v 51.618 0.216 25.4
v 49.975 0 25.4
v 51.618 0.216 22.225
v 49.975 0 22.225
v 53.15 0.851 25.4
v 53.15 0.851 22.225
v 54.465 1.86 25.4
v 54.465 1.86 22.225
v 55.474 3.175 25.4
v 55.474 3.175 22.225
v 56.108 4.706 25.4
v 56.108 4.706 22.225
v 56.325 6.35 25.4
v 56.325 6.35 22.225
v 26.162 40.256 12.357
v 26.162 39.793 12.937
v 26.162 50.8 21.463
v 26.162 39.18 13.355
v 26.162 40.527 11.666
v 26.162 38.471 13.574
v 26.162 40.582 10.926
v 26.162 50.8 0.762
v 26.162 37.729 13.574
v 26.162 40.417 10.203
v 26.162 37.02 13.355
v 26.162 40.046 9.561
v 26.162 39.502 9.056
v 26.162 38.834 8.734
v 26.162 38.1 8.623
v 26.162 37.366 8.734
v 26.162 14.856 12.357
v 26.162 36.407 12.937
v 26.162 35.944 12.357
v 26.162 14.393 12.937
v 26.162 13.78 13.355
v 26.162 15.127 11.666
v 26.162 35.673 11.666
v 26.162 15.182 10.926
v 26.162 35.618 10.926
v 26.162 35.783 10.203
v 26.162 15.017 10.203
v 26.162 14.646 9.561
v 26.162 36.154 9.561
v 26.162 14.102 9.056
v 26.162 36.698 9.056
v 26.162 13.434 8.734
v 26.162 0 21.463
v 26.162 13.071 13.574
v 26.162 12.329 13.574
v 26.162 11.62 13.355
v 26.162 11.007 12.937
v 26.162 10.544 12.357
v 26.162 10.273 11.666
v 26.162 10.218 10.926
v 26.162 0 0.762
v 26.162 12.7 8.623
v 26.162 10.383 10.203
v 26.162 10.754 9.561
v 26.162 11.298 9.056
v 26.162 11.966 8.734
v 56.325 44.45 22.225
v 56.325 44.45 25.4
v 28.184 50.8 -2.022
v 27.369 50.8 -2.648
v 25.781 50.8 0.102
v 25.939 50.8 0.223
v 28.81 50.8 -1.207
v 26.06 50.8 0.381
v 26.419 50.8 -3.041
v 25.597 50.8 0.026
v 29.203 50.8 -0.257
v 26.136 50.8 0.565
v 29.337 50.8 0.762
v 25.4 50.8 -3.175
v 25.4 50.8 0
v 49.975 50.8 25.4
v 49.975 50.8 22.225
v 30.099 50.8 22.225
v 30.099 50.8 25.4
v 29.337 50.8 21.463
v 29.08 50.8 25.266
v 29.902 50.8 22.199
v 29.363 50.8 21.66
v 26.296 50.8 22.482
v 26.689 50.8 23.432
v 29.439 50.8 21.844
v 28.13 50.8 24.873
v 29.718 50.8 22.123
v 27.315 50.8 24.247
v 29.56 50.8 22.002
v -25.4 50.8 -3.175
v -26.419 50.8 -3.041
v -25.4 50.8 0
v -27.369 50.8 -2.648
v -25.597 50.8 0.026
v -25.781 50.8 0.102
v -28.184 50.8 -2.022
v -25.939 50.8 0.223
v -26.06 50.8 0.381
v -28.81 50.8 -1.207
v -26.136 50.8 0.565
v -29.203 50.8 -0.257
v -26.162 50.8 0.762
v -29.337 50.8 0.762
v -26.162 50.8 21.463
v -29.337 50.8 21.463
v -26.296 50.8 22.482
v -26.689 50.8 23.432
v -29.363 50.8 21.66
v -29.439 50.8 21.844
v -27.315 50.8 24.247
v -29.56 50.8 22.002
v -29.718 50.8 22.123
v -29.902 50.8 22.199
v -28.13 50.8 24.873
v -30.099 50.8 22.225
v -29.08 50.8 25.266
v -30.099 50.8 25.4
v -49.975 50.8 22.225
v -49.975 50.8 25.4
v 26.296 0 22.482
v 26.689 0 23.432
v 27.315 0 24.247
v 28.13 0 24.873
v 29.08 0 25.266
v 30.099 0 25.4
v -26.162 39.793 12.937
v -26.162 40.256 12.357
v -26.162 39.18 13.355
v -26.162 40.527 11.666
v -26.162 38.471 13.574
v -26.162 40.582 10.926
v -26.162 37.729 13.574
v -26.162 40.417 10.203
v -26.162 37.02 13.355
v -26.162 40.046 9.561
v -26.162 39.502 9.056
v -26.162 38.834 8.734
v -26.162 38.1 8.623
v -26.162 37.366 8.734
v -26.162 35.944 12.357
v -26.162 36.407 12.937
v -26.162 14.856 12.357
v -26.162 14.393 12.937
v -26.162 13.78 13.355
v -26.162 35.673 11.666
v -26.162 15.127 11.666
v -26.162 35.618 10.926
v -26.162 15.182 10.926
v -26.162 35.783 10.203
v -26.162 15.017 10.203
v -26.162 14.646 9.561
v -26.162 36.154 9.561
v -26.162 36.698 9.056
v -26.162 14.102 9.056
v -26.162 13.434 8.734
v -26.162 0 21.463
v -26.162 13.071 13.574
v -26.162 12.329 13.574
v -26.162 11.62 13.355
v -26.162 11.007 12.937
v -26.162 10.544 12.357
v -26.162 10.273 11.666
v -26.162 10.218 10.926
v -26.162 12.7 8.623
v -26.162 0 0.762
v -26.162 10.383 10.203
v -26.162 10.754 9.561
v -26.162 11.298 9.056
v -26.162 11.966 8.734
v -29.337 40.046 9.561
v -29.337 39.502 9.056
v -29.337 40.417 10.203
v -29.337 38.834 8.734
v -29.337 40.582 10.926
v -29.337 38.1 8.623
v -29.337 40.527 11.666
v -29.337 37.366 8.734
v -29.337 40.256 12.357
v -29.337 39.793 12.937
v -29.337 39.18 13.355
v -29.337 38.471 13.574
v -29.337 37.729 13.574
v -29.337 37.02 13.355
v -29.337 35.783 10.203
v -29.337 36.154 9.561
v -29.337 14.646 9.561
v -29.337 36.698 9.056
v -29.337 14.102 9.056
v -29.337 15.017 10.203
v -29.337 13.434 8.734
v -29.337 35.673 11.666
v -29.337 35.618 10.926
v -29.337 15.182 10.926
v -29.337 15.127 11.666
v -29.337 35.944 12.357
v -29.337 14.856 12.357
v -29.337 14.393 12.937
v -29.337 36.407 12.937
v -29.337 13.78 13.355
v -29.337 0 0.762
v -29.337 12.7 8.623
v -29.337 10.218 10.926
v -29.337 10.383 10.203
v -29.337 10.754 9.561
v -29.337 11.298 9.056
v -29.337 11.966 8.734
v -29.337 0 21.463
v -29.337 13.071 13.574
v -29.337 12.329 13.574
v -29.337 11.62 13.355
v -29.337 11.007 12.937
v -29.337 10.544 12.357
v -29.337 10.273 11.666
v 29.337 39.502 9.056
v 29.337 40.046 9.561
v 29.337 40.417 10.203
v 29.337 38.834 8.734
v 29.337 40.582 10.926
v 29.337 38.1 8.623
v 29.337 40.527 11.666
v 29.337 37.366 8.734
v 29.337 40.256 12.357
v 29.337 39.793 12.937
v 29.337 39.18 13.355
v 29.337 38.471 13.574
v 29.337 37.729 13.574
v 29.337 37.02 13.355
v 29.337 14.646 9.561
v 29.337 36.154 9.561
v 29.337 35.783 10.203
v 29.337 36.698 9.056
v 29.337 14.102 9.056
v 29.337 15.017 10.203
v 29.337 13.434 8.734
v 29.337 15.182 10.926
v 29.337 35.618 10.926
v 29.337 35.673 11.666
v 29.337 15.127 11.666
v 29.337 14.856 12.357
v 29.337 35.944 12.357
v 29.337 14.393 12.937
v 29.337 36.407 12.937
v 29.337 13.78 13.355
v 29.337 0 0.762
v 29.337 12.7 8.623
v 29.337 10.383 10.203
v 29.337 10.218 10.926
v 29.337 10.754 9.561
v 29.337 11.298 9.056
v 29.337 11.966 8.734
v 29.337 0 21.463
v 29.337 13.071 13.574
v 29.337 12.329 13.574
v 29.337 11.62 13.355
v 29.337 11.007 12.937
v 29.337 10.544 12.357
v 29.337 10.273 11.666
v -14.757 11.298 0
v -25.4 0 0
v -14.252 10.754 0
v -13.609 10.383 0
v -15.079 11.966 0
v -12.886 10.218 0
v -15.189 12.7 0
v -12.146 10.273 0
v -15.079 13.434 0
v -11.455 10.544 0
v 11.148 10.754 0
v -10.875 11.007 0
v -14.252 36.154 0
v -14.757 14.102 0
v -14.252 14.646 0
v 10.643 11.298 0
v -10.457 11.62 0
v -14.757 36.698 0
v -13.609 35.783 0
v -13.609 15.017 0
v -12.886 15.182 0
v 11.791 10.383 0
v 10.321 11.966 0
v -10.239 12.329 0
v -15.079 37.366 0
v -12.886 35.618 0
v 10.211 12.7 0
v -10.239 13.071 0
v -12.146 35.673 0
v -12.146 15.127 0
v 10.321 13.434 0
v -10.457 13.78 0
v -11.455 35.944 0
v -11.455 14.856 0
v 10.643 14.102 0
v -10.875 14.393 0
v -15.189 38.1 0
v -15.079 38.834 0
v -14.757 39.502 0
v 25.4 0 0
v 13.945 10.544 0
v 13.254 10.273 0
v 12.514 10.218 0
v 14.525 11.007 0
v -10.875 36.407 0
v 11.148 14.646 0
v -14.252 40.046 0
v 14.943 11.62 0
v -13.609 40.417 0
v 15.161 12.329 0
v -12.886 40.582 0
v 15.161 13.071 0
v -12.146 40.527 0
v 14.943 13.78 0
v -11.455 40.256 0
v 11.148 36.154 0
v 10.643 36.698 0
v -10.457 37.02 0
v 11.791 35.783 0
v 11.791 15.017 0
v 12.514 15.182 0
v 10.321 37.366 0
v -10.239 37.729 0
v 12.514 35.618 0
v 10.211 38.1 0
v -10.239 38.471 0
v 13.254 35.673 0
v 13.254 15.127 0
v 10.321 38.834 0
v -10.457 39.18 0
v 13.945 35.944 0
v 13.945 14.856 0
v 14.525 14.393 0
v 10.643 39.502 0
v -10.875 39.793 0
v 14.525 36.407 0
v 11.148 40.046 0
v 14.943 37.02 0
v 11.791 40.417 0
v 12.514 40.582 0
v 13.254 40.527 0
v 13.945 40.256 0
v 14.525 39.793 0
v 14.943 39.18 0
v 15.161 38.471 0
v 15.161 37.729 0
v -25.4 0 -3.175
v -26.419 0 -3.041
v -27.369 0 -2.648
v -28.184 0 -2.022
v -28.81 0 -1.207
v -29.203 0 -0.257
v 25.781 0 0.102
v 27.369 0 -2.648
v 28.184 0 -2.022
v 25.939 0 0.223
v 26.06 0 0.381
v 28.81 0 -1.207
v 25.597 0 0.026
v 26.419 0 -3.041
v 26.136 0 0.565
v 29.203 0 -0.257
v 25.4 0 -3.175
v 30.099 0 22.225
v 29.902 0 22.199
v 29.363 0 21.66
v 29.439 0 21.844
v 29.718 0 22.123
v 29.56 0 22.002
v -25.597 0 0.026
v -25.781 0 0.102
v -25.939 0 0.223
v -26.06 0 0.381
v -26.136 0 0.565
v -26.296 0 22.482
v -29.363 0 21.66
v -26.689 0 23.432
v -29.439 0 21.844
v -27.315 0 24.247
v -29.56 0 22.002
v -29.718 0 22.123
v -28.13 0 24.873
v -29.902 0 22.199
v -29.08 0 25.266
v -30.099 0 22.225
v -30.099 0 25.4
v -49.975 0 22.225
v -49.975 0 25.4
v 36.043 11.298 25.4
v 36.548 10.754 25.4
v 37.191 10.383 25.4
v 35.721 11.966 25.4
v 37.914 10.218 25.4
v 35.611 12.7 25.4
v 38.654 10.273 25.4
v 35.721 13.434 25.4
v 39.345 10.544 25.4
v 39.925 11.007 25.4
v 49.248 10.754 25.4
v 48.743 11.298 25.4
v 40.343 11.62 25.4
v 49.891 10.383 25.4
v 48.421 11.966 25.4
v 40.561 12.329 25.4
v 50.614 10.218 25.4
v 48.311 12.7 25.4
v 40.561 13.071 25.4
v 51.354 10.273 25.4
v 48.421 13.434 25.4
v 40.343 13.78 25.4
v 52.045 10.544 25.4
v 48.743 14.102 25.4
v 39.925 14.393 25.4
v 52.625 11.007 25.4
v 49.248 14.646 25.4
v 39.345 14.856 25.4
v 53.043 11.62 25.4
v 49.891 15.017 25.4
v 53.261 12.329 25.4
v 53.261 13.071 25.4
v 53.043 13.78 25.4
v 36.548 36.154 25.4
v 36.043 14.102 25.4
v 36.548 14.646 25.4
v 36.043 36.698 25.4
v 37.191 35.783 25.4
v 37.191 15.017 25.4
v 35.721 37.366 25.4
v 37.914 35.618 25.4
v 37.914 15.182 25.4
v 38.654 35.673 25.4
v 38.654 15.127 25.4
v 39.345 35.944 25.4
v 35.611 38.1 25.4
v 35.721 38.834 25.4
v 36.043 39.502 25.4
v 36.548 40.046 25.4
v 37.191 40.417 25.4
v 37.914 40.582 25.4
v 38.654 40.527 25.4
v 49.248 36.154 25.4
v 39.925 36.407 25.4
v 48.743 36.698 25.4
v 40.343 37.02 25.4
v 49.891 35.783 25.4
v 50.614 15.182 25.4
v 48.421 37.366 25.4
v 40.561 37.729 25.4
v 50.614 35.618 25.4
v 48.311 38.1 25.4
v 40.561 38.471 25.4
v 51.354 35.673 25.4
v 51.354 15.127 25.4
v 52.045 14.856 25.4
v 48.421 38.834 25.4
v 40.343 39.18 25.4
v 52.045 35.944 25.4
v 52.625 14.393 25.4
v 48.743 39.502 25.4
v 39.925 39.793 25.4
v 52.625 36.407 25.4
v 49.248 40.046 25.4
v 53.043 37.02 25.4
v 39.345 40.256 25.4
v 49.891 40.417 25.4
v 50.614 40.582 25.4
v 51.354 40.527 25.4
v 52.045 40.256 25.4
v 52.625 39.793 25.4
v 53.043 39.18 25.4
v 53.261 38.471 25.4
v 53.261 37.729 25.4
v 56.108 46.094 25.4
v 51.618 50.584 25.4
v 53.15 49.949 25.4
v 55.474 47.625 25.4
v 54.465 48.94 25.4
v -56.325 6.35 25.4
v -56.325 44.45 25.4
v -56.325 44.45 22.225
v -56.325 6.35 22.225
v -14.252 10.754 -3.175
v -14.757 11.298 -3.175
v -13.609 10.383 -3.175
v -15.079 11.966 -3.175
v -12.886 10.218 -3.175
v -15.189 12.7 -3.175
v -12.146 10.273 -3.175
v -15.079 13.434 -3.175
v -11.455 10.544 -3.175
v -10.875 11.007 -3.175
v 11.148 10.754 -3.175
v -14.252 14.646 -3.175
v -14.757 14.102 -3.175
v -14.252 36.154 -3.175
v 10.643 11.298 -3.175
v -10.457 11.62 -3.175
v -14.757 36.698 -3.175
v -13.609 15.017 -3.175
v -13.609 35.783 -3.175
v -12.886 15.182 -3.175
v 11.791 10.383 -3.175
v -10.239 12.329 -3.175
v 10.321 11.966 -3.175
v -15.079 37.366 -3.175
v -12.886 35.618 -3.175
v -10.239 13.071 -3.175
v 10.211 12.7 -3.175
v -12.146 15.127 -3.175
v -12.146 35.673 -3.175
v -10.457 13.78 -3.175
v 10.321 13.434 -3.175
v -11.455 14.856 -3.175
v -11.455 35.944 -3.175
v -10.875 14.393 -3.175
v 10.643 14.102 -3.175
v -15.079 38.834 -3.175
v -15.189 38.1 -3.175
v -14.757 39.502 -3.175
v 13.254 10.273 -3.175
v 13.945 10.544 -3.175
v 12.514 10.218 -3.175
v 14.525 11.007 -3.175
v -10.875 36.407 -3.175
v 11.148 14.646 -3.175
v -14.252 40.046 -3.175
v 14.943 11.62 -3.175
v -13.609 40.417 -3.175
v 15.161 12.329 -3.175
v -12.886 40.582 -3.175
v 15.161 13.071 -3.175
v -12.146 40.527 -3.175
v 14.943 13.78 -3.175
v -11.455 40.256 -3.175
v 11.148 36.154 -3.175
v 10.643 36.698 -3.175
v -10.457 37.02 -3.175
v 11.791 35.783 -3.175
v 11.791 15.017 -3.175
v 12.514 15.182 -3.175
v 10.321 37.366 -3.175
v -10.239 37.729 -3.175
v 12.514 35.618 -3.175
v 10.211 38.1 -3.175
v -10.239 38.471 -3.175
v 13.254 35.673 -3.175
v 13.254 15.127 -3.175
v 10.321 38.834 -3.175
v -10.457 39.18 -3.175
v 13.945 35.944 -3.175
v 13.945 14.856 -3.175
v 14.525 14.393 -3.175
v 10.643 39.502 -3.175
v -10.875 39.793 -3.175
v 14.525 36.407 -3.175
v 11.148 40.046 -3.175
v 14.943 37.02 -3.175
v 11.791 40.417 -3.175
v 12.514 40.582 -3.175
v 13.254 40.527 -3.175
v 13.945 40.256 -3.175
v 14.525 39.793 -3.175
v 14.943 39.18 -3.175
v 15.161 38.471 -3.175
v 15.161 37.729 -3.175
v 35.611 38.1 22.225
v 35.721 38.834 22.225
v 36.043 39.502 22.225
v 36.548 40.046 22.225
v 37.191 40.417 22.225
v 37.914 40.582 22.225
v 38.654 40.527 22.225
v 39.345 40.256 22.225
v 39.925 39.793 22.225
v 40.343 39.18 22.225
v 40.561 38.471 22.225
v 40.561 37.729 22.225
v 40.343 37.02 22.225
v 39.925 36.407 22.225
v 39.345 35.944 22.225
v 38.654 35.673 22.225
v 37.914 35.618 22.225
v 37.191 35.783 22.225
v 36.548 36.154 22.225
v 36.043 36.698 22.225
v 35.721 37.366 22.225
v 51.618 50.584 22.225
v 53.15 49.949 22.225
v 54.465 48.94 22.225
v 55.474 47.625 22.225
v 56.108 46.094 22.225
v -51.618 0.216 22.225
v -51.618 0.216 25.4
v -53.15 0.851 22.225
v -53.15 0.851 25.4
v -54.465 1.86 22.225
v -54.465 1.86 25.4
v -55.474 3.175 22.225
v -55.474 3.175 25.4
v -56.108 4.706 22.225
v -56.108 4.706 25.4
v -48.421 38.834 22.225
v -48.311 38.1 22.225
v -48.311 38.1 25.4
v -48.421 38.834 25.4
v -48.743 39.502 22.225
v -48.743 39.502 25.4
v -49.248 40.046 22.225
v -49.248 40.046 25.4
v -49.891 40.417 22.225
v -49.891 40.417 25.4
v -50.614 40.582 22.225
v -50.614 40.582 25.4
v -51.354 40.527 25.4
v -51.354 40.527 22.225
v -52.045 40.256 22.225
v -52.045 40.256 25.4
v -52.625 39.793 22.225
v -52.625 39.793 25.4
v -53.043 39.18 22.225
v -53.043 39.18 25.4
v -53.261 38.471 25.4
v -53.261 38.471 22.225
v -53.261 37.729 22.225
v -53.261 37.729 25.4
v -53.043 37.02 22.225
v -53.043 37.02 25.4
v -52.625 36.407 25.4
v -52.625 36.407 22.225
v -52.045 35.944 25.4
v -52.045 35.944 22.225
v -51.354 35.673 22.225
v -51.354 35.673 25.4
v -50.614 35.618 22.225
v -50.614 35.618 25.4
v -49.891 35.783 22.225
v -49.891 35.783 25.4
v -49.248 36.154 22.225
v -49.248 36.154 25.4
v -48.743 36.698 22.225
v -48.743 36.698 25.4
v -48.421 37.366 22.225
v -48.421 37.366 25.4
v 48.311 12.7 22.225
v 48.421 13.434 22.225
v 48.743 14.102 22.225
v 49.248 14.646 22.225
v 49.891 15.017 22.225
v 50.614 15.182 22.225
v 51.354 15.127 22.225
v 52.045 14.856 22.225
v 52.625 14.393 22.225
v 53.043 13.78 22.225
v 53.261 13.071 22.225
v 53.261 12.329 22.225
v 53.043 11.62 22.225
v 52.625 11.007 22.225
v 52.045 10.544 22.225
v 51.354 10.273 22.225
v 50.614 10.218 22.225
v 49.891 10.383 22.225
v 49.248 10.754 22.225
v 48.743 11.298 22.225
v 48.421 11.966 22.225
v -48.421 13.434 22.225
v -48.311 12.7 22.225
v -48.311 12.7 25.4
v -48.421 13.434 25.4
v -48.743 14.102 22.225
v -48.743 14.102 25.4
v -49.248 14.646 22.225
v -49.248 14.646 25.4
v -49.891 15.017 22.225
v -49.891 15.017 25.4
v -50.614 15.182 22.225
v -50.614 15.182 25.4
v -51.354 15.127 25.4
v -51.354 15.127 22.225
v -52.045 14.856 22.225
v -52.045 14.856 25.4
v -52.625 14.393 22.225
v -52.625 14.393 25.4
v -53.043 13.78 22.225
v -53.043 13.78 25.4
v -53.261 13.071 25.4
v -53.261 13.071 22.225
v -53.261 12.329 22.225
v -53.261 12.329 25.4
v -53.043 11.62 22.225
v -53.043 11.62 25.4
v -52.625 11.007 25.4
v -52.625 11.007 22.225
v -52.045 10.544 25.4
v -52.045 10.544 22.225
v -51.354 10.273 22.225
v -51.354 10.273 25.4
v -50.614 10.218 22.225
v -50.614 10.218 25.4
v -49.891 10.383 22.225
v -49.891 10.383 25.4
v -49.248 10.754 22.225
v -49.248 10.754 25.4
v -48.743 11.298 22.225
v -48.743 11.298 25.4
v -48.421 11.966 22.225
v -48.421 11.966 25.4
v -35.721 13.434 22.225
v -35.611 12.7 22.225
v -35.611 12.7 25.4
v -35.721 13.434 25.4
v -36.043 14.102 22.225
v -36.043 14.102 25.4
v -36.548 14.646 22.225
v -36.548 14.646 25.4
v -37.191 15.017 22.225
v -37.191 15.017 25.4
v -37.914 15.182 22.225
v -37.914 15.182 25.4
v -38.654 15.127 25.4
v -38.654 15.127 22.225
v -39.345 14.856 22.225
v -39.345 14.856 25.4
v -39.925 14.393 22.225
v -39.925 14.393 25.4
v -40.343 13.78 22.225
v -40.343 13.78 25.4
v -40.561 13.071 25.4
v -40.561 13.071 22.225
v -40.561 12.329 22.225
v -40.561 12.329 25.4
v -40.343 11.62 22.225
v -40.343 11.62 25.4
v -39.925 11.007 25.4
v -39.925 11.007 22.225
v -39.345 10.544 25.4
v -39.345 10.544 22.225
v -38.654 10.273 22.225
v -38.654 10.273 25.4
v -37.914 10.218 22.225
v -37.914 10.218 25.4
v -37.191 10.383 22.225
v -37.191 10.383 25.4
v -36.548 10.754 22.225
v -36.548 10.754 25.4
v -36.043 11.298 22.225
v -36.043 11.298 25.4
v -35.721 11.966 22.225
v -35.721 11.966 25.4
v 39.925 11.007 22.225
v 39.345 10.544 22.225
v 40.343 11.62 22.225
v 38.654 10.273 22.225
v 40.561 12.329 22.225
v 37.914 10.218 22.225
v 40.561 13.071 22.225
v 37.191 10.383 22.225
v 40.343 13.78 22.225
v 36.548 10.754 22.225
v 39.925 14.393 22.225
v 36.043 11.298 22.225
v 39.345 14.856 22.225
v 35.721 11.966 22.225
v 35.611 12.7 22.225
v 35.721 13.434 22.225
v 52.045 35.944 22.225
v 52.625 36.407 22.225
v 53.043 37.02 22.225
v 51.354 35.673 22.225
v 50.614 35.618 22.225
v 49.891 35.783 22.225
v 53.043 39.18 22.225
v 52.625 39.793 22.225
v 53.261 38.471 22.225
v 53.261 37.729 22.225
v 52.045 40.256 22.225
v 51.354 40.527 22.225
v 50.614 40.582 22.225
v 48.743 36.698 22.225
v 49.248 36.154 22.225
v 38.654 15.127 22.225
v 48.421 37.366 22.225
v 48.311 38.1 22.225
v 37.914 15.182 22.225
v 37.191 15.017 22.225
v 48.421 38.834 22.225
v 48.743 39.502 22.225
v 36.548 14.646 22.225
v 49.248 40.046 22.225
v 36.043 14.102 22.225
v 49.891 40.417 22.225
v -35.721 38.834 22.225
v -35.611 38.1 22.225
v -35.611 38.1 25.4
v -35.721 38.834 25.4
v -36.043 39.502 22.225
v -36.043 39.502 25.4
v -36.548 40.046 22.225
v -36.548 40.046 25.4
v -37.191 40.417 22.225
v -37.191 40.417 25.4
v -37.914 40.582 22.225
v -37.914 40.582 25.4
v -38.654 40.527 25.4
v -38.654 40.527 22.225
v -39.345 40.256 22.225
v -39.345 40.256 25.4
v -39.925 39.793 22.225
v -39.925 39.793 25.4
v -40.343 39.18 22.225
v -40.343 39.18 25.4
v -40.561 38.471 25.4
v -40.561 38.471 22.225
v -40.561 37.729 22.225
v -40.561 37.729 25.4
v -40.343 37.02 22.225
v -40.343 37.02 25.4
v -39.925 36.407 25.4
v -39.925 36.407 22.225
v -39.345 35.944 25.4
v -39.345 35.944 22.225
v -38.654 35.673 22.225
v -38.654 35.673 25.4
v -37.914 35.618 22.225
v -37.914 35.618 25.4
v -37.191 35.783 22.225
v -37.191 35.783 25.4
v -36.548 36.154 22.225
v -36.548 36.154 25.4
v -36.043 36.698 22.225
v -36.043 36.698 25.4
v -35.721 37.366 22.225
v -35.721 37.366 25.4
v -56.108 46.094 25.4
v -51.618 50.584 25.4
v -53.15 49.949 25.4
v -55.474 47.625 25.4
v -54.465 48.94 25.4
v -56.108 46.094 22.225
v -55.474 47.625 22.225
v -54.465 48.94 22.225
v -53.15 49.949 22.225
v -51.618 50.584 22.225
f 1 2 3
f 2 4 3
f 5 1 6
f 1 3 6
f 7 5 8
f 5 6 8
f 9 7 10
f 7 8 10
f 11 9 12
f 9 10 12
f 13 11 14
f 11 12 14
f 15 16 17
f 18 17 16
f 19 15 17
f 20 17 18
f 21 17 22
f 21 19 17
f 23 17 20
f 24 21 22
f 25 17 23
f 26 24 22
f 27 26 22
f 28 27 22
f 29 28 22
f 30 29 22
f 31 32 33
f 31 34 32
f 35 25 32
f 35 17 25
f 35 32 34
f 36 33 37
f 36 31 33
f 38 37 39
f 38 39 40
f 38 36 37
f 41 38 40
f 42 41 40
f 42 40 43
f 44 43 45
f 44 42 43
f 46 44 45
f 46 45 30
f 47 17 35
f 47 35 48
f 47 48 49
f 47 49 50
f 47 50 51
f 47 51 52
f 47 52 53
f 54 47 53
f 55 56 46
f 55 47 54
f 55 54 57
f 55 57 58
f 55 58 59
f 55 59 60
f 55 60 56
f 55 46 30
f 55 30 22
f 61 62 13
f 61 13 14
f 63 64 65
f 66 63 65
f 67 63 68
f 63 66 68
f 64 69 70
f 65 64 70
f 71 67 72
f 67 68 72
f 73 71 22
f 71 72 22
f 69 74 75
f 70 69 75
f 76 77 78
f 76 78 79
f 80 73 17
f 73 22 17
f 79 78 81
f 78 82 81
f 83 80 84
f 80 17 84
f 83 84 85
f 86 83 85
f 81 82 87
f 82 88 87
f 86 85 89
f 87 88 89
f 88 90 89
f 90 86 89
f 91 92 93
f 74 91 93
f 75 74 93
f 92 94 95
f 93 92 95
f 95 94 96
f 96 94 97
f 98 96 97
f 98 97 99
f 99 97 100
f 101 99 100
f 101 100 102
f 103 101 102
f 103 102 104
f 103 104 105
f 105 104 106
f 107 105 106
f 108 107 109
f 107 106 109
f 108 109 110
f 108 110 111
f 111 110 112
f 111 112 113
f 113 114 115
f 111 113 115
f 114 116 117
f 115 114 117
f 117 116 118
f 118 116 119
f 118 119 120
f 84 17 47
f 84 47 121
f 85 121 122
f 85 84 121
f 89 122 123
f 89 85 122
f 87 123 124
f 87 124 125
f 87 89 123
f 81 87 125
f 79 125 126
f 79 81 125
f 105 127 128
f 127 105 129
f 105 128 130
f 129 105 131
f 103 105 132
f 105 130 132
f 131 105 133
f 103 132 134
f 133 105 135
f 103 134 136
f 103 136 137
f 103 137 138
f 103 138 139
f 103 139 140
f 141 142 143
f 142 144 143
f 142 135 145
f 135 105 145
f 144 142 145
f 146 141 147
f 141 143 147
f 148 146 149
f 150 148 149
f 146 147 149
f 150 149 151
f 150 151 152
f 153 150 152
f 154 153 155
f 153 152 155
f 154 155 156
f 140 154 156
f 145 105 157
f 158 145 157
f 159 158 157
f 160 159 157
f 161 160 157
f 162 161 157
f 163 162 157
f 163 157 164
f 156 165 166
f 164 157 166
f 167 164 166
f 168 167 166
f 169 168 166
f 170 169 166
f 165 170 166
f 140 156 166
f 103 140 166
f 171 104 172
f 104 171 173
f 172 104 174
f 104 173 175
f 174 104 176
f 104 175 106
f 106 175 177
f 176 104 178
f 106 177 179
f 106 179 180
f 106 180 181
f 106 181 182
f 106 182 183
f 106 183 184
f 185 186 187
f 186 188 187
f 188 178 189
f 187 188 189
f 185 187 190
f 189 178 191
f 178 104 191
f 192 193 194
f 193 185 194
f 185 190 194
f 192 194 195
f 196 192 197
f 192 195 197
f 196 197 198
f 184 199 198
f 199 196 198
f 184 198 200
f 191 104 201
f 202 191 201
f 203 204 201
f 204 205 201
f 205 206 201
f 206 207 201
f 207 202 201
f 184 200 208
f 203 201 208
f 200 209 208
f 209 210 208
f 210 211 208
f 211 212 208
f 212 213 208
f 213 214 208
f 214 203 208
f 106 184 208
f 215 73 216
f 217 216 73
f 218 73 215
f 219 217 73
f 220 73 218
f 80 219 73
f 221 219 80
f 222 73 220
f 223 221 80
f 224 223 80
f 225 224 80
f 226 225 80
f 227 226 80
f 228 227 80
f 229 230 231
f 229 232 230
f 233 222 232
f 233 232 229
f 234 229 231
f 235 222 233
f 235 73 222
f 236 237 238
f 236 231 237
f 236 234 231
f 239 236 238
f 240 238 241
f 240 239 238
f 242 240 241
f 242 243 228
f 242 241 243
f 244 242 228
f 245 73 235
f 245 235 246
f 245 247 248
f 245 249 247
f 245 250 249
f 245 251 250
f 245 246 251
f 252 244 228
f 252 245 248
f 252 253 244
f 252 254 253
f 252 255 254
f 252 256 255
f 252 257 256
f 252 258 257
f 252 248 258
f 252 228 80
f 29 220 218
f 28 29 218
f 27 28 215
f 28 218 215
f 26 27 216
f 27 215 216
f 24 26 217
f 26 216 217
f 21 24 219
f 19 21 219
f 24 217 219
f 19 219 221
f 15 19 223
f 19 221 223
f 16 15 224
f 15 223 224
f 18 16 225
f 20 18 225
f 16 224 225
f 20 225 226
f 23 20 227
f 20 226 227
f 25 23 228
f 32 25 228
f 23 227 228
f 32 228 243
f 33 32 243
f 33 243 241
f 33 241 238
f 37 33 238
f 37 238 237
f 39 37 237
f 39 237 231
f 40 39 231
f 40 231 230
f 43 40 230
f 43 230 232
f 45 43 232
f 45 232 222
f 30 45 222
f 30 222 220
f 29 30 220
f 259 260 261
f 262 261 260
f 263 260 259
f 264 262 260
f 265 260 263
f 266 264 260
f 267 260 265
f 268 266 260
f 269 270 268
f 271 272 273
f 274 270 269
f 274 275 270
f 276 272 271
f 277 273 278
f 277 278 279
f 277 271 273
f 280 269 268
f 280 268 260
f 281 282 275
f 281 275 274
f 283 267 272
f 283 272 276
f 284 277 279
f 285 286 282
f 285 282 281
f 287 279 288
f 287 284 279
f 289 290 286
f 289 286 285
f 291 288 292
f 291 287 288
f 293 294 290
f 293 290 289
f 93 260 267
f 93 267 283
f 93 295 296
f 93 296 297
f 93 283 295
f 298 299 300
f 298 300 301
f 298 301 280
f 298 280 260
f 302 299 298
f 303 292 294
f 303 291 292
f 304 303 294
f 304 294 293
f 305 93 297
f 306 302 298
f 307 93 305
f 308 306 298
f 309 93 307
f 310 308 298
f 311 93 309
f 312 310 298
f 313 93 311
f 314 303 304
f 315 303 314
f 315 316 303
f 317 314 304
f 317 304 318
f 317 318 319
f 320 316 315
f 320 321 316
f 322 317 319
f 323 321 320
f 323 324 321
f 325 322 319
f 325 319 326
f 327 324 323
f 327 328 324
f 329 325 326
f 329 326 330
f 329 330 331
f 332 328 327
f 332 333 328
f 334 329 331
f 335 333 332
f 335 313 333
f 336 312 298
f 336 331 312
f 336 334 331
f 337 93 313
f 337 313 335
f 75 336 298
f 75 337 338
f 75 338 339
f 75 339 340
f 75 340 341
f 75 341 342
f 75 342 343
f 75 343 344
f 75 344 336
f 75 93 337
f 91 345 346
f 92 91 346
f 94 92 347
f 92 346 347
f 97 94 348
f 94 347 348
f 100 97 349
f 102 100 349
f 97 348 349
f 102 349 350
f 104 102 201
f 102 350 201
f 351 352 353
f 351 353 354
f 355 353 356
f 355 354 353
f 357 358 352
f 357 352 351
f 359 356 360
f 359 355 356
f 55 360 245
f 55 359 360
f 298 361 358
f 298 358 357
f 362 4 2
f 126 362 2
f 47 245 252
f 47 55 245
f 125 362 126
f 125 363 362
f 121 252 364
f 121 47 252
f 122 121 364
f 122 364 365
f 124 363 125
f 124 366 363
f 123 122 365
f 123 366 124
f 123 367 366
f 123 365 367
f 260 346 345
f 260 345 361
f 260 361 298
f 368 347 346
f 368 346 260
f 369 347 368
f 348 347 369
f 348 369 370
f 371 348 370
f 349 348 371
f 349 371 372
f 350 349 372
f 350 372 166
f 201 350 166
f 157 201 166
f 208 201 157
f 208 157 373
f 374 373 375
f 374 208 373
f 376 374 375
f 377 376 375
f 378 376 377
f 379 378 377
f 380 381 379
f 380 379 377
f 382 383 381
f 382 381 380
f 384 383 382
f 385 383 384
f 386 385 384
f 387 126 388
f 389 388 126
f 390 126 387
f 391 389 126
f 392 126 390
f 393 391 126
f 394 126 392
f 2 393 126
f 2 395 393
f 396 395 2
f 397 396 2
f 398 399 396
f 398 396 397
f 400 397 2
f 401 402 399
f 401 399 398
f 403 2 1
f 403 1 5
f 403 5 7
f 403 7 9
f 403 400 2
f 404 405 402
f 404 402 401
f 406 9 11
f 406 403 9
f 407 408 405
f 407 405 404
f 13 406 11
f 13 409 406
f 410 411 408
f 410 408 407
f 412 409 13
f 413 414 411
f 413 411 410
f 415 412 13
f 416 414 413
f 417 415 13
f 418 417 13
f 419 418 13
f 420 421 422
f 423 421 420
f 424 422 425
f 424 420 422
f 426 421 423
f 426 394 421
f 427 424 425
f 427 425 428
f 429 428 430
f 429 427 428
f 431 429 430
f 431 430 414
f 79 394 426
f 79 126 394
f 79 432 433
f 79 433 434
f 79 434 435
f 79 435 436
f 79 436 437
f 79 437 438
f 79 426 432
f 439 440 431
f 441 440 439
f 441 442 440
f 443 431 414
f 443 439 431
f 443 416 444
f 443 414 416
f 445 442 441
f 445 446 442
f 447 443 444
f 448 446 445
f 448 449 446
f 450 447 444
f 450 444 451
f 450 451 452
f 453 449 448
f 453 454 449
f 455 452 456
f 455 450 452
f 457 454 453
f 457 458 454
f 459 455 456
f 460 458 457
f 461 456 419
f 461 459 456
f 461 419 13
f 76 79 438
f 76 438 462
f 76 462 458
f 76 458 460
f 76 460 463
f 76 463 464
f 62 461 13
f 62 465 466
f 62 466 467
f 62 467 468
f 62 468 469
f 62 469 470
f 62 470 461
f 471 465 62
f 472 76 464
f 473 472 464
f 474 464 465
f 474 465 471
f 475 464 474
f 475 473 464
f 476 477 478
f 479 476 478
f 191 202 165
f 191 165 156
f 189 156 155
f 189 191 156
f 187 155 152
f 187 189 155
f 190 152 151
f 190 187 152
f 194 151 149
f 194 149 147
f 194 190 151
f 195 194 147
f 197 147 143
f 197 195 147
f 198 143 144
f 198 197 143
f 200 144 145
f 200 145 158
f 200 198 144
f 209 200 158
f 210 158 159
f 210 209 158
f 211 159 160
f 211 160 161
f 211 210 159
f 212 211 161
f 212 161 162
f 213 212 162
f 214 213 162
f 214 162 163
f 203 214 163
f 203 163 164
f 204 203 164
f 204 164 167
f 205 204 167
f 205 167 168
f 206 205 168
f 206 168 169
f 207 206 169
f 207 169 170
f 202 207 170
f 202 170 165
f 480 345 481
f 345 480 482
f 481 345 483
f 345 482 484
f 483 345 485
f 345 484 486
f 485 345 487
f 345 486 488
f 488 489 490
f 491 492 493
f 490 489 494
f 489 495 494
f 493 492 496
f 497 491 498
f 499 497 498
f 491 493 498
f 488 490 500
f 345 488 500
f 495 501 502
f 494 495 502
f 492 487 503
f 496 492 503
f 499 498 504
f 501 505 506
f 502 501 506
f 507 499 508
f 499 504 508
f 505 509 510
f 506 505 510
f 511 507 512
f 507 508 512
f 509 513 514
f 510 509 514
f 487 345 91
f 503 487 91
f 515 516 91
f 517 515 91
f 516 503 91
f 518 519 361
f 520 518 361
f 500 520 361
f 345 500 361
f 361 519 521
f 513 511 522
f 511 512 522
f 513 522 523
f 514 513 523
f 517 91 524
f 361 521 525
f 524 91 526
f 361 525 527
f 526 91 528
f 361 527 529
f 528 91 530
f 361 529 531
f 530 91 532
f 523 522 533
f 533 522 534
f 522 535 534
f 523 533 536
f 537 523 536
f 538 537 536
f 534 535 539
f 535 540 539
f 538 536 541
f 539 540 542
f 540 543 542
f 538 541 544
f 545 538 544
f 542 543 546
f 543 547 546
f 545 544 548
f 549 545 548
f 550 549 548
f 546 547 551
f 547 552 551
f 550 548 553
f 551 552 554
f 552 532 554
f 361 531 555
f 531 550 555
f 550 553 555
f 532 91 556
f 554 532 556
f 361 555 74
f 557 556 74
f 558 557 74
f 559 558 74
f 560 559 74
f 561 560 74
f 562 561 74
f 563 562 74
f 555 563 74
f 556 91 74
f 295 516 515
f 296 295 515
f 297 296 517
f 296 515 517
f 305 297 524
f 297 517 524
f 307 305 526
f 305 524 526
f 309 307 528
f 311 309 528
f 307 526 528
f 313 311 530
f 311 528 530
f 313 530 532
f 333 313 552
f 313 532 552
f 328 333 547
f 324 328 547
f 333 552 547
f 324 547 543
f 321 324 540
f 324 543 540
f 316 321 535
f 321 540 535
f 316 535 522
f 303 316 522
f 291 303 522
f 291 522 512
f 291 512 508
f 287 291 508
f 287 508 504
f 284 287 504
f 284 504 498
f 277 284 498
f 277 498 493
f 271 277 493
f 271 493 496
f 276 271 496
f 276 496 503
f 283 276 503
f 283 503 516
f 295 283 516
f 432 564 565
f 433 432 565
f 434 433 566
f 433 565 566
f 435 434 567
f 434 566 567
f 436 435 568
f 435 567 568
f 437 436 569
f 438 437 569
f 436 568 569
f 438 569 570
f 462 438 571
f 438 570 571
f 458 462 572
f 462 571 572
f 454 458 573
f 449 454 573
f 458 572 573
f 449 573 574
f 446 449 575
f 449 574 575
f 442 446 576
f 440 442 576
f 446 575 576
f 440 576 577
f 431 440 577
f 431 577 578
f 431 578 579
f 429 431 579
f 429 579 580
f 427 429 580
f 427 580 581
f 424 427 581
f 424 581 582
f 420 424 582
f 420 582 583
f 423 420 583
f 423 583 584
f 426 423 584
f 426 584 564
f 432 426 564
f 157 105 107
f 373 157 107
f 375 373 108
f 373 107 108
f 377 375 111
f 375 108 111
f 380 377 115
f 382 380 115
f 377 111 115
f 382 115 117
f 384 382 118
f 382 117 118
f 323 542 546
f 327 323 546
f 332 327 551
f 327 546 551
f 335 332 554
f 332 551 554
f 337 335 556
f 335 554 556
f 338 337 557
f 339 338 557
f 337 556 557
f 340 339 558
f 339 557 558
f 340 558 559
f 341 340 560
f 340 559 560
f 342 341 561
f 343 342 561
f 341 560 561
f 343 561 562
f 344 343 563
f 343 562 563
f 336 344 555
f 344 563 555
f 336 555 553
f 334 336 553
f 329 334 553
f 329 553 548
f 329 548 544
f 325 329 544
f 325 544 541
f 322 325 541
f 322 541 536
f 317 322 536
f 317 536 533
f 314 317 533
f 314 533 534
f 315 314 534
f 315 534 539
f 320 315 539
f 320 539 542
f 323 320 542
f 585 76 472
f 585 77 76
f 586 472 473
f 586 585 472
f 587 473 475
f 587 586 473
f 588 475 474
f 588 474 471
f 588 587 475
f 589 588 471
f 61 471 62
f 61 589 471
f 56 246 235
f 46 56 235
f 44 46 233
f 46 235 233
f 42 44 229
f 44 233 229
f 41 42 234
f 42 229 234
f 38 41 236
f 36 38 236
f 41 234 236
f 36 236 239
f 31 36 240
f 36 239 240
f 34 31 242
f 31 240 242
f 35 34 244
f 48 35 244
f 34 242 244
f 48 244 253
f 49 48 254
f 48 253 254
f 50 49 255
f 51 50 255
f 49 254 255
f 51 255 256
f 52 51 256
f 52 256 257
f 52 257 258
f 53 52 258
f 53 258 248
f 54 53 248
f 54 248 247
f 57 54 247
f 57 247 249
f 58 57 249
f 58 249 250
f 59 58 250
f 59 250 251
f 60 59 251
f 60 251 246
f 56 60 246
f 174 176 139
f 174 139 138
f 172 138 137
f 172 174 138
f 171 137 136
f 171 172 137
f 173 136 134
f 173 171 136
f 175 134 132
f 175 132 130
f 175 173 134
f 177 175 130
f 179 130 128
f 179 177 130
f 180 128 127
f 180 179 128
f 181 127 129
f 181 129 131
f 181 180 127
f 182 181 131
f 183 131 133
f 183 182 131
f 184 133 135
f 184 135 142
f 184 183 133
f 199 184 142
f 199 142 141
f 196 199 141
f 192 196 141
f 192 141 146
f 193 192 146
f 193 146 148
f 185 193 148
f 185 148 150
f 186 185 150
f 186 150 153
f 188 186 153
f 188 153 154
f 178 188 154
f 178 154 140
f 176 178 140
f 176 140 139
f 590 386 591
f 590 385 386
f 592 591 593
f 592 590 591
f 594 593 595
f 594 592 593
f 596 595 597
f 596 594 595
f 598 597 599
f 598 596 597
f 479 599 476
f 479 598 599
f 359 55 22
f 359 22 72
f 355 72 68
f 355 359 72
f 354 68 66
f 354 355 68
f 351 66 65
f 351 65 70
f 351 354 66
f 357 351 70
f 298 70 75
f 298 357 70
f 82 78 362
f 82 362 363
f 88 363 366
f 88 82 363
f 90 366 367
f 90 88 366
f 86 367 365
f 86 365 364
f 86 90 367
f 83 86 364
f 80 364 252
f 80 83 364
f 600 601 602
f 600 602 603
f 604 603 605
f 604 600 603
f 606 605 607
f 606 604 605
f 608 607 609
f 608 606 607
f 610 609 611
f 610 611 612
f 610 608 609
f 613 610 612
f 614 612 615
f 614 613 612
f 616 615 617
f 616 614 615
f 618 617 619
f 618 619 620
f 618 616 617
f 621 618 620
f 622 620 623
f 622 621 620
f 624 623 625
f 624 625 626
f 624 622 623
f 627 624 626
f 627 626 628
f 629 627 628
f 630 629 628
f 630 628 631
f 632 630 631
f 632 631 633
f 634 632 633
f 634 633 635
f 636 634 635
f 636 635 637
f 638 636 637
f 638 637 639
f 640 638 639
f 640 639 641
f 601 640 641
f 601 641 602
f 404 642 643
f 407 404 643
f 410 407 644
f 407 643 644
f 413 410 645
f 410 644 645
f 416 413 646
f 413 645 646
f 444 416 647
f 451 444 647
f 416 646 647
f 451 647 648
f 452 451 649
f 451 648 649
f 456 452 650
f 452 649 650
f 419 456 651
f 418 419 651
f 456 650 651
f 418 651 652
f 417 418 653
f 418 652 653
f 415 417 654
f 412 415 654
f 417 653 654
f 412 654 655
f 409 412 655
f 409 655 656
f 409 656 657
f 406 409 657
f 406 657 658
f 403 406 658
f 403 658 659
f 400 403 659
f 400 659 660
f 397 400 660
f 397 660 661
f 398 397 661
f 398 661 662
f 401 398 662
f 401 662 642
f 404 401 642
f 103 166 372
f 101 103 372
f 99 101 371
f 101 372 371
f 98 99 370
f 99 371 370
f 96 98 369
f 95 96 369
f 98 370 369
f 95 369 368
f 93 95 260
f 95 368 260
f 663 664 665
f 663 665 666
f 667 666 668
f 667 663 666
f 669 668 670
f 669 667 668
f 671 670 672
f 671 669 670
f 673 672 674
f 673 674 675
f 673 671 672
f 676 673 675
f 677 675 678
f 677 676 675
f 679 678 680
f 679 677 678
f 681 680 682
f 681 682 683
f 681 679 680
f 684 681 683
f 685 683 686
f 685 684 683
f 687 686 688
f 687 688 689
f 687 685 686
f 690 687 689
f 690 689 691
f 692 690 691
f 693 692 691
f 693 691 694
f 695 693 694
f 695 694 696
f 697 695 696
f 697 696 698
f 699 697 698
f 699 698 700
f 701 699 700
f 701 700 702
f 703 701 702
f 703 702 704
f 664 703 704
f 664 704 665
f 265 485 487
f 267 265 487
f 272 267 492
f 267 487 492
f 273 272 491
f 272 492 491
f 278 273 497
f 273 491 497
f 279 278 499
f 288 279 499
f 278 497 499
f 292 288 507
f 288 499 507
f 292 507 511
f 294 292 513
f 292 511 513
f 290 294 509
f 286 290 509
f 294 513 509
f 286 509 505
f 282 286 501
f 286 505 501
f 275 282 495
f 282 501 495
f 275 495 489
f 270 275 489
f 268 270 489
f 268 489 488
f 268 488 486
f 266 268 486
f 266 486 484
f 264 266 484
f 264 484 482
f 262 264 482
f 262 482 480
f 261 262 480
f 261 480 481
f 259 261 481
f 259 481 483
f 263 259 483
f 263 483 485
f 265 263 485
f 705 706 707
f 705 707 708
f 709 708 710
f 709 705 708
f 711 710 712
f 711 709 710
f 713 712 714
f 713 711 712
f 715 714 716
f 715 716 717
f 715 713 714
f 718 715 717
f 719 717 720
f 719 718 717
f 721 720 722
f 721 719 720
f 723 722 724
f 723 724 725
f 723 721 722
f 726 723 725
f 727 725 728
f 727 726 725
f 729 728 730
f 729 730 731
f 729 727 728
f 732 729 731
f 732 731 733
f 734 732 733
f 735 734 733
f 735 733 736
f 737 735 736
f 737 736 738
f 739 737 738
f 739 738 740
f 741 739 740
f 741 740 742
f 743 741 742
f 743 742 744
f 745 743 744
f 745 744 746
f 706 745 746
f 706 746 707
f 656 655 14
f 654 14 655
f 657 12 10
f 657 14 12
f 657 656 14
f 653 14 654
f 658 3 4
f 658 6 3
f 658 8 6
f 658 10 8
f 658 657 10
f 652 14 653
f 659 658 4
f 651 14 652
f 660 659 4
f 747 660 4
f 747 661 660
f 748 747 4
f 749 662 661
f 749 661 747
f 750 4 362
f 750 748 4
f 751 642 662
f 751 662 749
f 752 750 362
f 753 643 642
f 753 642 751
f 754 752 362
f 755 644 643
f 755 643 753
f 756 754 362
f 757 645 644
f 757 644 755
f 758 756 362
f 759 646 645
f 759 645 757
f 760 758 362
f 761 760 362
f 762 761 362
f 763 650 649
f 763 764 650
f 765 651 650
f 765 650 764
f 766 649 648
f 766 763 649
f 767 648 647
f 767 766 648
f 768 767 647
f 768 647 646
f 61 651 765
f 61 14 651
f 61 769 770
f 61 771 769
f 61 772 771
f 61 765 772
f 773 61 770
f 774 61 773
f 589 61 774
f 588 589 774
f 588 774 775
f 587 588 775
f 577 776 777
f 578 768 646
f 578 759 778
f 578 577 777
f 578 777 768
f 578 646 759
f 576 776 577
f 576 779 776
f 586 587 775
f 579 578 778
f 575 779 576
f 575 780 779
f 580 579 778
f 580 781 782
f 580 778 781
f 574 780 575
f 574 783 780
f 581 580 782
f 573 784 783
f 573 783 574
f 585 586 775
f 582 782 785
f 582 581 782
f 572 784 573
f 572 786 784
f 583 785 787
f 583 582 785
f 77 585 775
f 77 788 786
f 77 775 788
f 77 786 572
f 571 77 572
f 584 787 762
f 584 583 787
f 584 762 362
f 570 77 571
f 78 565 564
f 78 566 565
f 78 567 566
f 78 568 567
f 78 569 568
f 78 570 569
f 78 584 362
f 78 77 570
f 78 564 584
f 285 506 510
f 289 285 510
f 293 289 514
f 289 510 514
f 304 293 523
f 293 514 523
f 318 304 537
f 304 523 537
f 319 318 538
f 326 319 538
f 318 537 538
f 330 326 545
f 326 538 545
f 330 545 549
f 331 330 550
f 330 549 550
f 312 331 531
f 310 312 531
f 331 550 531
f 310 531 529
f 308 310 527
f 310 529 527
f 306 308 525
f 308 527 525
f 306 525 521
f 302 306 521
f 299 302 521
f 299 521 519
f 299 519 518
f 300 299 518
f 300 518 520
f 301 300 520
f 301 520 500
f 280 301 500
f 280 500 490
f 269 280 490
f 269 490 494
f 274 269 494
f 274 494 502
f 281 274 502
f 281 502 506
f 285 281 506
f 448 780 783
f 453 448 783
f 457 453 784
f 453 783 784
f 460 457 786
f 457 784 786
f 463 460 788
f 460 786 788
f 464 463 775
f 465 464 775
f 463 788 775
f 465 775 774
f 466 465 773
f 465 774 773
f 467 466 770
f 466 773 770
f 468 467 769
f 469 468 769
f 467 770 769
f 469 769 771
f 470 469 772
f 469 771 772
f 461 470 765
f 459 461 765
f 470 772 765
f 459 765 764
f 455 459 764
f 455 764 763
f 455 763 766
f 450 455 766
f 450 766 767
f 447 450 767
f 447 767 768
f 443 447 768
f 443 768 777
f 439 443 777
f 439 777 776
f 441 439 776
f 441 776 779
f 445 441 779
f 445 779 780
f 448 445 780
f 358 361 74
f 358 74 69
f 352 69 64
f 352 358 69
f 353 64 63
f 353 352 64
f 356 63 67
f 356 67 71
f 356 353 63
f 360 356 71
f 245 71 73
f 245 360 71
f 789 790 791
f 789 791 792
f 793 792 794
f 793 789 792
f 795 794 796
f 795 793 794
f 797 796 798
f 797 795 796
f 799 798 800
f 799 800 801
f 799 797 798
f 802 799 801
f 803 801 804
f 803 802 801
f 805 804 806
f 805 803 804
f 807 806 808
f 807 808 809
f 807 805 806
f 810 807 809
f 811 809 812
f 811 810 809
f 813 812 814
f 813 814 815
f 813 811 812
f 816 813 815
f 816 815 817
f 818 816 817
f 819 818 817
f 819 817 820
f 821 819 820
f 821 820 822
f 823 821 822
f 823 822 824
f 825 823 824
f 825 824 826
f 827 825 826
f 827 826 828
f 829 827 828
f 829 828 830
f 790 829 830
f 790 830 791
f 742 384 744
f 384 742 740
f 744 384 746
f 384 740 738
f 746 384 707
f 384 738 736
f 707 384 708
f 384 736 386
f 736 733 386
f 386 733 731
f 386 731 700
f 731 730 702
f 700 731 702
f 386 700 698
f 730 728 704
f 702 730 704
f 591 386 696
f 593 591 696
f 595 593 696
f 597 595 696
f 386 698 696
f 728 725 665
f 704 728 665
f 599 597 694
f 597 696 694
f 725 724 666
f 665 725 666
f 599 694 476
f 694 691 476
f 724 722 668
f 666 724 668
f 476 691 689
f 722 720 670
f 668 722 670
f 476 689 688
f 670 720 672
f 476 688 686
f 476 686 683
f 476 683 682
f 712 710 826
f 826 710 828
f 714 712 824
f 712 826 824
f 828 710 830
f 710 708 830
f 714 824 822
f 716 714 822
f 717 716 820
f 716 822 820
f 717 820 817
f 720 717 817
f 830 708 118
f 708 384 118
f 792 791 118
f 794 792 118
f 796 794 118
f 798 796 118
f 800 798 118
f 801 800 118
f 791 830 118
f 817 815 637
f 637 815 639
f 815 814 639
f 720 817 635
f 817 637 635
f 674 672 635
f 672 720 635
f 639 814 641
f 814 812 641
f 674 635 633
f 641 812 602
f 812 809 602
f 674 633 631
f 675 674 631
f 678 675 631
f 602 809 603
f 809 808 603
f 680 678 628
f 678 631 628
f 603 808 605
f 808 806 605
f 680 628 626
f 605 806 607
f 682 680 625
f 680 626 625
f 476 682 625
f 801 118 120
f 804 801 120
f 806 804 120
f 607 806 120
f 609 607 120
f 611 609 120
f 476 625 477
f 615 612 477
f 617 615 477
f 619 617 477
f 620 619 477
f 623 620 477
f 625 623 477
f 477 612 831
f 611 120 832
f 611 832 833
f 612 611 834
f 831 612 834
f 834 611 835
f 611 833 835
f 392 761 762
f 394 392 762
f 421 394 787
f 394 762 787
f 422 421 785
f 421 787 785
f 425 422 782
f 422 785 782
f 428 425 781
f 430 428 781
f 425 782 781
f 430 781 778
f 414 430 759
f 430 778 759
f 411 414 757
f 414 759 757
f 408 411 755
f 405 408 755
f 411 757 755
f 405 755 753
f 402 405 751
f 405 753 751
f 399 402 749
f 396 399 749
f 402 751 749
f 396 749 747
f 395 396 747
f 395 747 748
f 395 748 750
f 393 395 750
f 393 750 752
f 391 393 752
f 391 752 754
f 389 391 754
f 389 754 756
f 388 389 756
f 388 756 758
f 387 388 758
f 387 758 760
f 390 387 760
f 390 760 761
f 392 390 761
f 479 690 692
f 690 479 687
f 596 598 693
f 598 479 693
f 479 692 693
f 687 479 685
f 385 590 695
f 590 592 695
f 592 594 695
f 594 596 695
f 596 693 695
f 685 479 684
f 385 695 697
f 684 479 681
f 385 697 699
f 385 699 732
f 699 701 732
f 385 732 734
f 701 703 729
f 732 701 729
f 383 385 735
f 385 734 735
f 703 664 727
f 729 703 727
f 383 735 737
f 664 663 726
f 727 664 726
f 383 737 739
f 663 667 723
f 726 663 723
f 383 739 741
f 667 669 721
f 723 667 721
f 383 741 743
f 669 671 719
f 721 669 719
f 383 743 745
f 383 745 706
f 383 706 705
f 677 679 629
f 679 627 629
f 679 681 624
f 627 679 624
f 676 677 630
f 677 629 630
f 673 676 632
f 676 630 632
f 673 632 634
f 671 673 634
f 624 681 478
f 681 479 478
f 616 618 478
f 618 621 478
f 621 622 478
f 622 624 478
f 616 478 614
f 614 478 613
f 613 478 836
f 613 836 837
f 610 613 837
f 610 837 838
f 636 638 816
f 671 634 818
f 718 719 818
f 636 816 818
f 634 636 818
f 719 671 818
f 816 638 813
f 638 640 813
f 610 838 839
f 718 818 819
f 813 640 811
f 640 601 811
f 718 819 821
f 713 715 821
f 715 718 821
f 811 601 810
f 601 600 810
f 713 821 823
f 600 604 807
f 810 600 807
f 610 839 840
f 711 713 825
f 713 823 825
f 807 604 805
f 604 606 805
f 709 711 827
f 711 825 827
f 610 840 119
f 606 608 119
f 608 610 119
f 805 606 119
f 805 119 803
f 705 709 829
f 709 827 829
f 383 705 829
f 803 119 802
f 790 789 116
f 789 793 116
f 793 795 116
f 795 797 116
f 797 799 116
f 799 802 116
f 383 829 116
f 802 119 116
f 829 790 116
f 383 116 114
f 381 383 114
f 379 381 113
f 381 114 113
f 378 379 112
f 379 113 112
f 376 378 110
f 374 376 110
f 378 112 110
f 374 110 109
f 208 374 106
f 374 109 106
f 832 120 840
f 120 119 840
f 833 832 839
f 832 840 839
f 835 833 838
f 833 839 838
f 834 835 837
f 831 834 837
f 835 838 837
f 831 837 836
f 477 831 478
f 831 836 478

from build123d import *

# Parameters (mm, degrees)
SKETCH1_W                    = 50.8
SKETCH1_H                    = 50.8
BASE_FLANGE1_DEPTH           = 3.175
EDGE_FLANGE1_DEPTH           = 50.8
EDGE_FLANGE2_STRIP_W         = 14.224
EDGE_FLANGE2_STRIP_H         = 3.175
EDGE_FLANGE2_STRIP_CUT_DEPTH = 50.8
EDGE_FLANGE2_DEPTH           = 50.8
CUT_EXTRUDE1_REACH           = 80.879
SKETCH16_R                   = 2.4892
CUT_EXTRUDE2_REACH           = 81.989
SKETCH17_R                   = 2.4892
CUT_EXTRUDE3_REACH           = 83.053
SKETCH18_R                   = 2.4892
FILLET1_R                    = 6.35
FILLET1_OF_MIRROR1_R         = 6.35


# Sheet-metal steps are written as plain solids
with BuildPart() as part:
    # Sketch1 → Base-Flange1 (new body)
    with BuildSketch(Plane.XY):
        with Locations((0, 25.4)):
            Rectangle(SKETCH1_W, SKETCH1_H)
    extrude(amount=-BASE_FLANGE1_DEPTH)

    # Edge-Flange1 section (across the edge) → Edge-Flange1 (add)
    with BuildSketch(Plane(origin=(26.162, 0, 0), x_dir=(-1, 0, 0), z_dir=(0, 1, 0))):
        with BuildLine():
            Line((-3.175, 0.762), (-3.175, 22.225))
            Line((-3.175, 22.225), (0, 22.225))
            Line((0, 22.225), (0, 0.762))
            ThreePointArc((0, 0.762), (0.223184633, 0.223184633), (0.762, 0))
            Line((0.762, 0), (0.762, -3.175))
            ThreePointArc((0.762, -3.175), (-2.021879398, -2.021879398), (-3.175, 0.762))
        make_face()
    edge_flange1 = extrude(amount=EDGE_FLANGE1_DEPTH)

    # Edge-Flange2 strip (across the edge) → Edge-Flange2 strip cut (cut)
    with BuildSketch(Plane(origin=(29.337, 50.8, 22.225), x_dir=(0, 0, -1), z_dir=(0, -1, 0))):
        with Locations((-6.35, -1.5875)):
            Rectangle(EDGE_FLANGE2_STRIP_W, EDGE_FLANGE2_STRIP_H)
    edge_flange2_strip_cut = extrude(amount=EDGE_FLANGE2_STRIP_CUT_DEPTH, mode=Mode.SUBTRACT)

    # Edge-Flange2 section (across the edge) → Edge-Flange2 (add)
    with BuildSketch(Plane(origin=(29.337, 50.8, 22.225), x_dir=(0, 0, -1), z_dir=(0, -1, 0))):
        with BuildLine():
            Line((-3.175, 0.762), (-3.175, 26.9875))
            Line((-3.175, 26.9875), (0, 26.9875))
            Line((0, 26.9875), (0, 0.762))
            ThreePointArc((0, 0.762), (0.223184633, 0.223184633), (0.762, 0))
            Line((0.762, 0), (0.762, -3.175))
            ThreePointArc((0.762, -3.175), (-2.021879398, -2.021879398), (-3.175, 0.762))
        make_face()
    edge_flange2 = extrude(amount=EDGE_FLANGE2_DEPTH)

    # Sketch16 → Cut-Extrude1 (cut, up to next)
    with BuildSketch(Plane(origin=(29.337, 0, 0), x_dir=(0, 0, -1), z_dir=(1, 0, 0)), mode=Mode.PRIVATE) as cut_extrude1_sk1:
        with Locations((-11.1125, 38.1)):
            Circle(SKETCH16_R)
    cut_extrude1_tool1 = extrude(cut_extrude1_sk1.sketch, amount=-CUT_EXTRUDE1_REACH, mode=Mode.PRIVATE) & part.part
    # Sketch16 → Cut-Extrude1 (cut, up to next)
    with BuildSketch(Plane(origin=(29.337, 0, 0), x_dir=(0, 0, -1), z_dir=(1, 0, 0)), mode=Mode.PRIVATE) as cut_extrude1_sk2:
        with Locations((-11.1125, 12.7)):
            Circle(SKETCH16_R)
    cut_extrude1_tool2 = extrude(cut_extrude1_sk2.sketch, amount=-CUT_EXTRUDE1_REACH, mode=Mode.PRIVATE) & part.part
    cut_extrude1_1 = cut_extrude1_tool1.solids().sort_by_distance((29.337, 38.1, 11.1125))[0]
    add(cut_extrude1_1, mode=Mode.SUBTRACT)
    cut_extrude1_2 = cut_extrude1_tool2.solids().sort_by_distance((29.337, 12.7, 11.1125))[0]
    add(cut_extrude1_2, mode=Mode.SUBTRACT)
    cut_extrude1 = cut_extrude1_1 + cut_extrude1_2  # Cut-Extrude1 as one shape, for the pattern or mirror that repeats it

    # Sketch17 → Cut-Extrude2 (cut, up to next)
    with BuildSketch(Plane(origin=(0, 0, 22.225), x_dir=(-1, 0, 0), z_dir=(0, 0, -1)), mode=Mode.PRIVATE) as cut_extrude2_sk1:
        with Locations((-50.8, 38.1)):
            Circle(SKETCH17_R)
    cut_extrude2_tool1 = extrude(cut_extrude2_sk1.sketch, amount=-CUT_EXTRUDE2_REACH, mode=Mode.PRIVATE) & part.part
    # Sketch17 → Cut-Extrude2 (cut, up to next)
    with BuildSketch(Plane(origin=(0, 0, 22.225), x_dir=(-1, 0, 0), z_dir=(0, 0, -1)), mode=Mode.PRIVATE) as cut_extrude2_sk2:
        with Locations((-38.1, 38.1)):
            Circle(SKETCH17_R)
    cut_extrude2_tool2 = extrude(cut_extrude2_sk2.sketch, amount=-CUT_EXTRUDE2_REACH, mode=Mode.PRIVATE) & part.part
    # Sketch17 → Cut-Extrude2 (cut, up to next)
    with BuildSketch(Plane(origin=(0, 0, 22.225), x_dir=(-1, 0, 0), z_dir=(0, 0, -1)), mode=Mode.PRIVATE) as cut_extrude2_sk3:
        with Locations((-38.1, 12.7)):
            Circle(SKETCH17_R)
    cut_extrude2_tool3 = extrude(cut_extrude2_sk3.sketch, amount=-CUT_EXTRUDE2_REACH, mode=Mode.PRIVATE) & part.part
    # Sketch17 → Cut-Extrude2 (cut, up to next)
    with BuildSketch(Plane(origin=(0, 0, 22.225), x_dir=(-1, 0, 0), z_dir=(0, 0, -1)), mode=Mode.PRIVATE) as cut_extrude2_sk4:
        with Locations((-50.8, 12.7)):
            Circle(SKETCH17_R)
    cut_extrude2_tool4 = extrude(cut_extrude2_sk4.sketch, amount=-CUT_EXTRUDE2_REACH, mode=Mode.PRIVATE) & part.part
    cut_extrude2_1 = cut_extrude2_tool1.solids().sort_by_distance((50.8, 38.1, 22.225))[0]
    add(cut_extrude2_1, mode=Mode.SUBTRACT)
    cut_extrude2_2 = cut_extrude2_tool2.solids().sort_by_distance((38.1, 38.1, 22.225))[0]
    add(cut_extrude2_2, mode=Mode.SUBTRACT)
    cut_extrude2_3 = cut_extrude2_tool3.solids().sort_by_distance((38.1, 12.7, 22.225))[0]
    add(cut_extrude2_3, mode=Mode.SUBTRACT)
    cut_extrude2_4 = cut_extrude2_tool4.solids().sort_by_distance((50.8, 12.7, 22.225))[0]
    add(cut_extrude2_4, mode=Mode.SUBTRACT)
    cut_extrude2 = cut_extrude2_1 + cut_extrude2_2 + cut_extrude2_3 + cut_extrude2_4  # Cut-Extrude2 as one shape, for the pattern or mirror that repeats it

    # Sketch18 → Cut-Extrude3 (cut, up to next)
    with BuildSketch(Plane(origin=(0, 0, -3.175), x_dir=(-1, 0, 0), z_dir=(0, 0, -1)), mode=Mode.PRIVATE) as cut_extrude3_sk1:
        with Locations((-12.7, 38.1)):
            Circle(SKETCH18_R)
    cut_extrude3_tool1 = extrude(cut_extrude3_sk1.sketch, amount=-CUT_EXTRUDE3_REACH, mode=Mode.PRIVATE) & part.part
    # Sketch18 → Cut-Extrude3 (cut, up to next)
    with BuildSketch(Plane(origin=(0, 0, -3.175), x_dir=(-1, 0, 0), z_dir=(0, 0, -1)), mode=Mode.PRIVATE) as cut_extrude3_sk2:
        with Locations((12.7, 38.1)):
            Circle(SKETCH18_R)
    cut_extrude3_tool2 = extrude(cut_extrude3_sk2.sketch, amount=-CUT_EXTRUDE3_REACH, mode=Mode.PRIVATE) & part.part
    # Sketch18 → Cut-Extrude3 (cut, up to next)
    with BuildSketch(Plane(origin=(0, 0, -3.175), x_dir=(-1, 0, 0), z_dir=(0, 0, -1)), mode=Mode.PRIVATE) as cut_extrude3_sk3:
        with Locations((12.7, 12.7)):
            Circle(SKETCH18_R)
    cut_extrude3_tool3 = extrude(cut_extrude3_sk3.sketch, amount=-CUT_EXTRUDE3_REACH, mode=Mode.PRIVATE) & part.part
    # Sketch18 → Cut-Extrude3 (cut, up to next)
    with BuildSketch(Plane(origin=(0, 0, -3.175), x_dir=(-1, 0, 0), z_dir=(0, 0, -1)), mode=Mode.PRIVATE) as cut_extrude3_sk4:
        with Locations((-12.7, 12.7)):
            Circle(SKETCH18_R)
    cut_extrude3_tool4 = extrude(cut_extrude3_sk4.sketch, amount=-CUT_EXTRUDE3_REACH, mode=Mode.PRIVATE) & part.part
    add(cut_extrude3_tool1.solids().sort_by_distance((12.7, 38.1, -3.175))[0], mode=Mode.SUBTRACT)
    add(cut_extrude3_tool2.solids().sort_by_distance((-12.7, 38.1, -3.175))[0], mode=Mode.SUBTRACT)
    add(cut_extrude3_tool3.solids().sort_by_distance((-12.7, 12.7, -3.175))[0], mode=Mode.SUBTRACT)
    add(cut_extrude3_tool4.solids().sort_by_distance((12.7, 12.7, -3.175))[0], mode=Mode.SUBTRACT)

    # Fillet1
    fillet1_edges = [part.edges().sort_by_distance(p)[0] for p in [
        (56.3245, 50.8, 23.8125),
        (56.3245, 0, 23.8125),
    ]]
    fillet(fillet1_edges, radius=FILLET1_R)

    # Mirror1: Edge-Flange1, Edge-Flange2 strip cut, Edge-Flange2, Cut-Extrude1, Cut-Extrude2 across plane
    add(edge_flange1.mirror(Plane(origin=(0, 0, 0), x_dir=(0, 0, 1), z_dir=(1, 0, 0))))
    add(edge_flange2_strip_cut.mirror(Plane(origin=(0, 0, 0), x_dir=(0, 0, 1), z_dir=(1, 0, 0))), mode=Mode.SUBTRACT)
    add(edge_flange2.mirror(Plane(origin=(0, 0, 0), x_dir=(0, 0, 1), z_dir=(1, 0, 0))))
    add(cut_extrude1.mirror(Plane(origin=(0, 0, 0), x_dir=(0, 0, 1), z_dir=(1, 0, 0))), mode=Mode.SUBTRACT)
    add(cut_extrude2.mirror(Plane(origin=(0, 0, 0), x_dir=(0, 0, 1), z_dir=(1, 0, 0))), mode=Mode.SUBTRACT)

    # Fillet1 of Mirror1
    fillet1_of_mirror1_edges = [part.edges().sort_by_distance(p)[0] for p in [
        (-56.3245, 50.8, 23.8125),
        (-56.3245, 0, 23.8125),
    ]]
    fillet(fillet1_of_mirror1_edges, radius=FILLET1_OF_MIRROR1_R)


solid = part.part
